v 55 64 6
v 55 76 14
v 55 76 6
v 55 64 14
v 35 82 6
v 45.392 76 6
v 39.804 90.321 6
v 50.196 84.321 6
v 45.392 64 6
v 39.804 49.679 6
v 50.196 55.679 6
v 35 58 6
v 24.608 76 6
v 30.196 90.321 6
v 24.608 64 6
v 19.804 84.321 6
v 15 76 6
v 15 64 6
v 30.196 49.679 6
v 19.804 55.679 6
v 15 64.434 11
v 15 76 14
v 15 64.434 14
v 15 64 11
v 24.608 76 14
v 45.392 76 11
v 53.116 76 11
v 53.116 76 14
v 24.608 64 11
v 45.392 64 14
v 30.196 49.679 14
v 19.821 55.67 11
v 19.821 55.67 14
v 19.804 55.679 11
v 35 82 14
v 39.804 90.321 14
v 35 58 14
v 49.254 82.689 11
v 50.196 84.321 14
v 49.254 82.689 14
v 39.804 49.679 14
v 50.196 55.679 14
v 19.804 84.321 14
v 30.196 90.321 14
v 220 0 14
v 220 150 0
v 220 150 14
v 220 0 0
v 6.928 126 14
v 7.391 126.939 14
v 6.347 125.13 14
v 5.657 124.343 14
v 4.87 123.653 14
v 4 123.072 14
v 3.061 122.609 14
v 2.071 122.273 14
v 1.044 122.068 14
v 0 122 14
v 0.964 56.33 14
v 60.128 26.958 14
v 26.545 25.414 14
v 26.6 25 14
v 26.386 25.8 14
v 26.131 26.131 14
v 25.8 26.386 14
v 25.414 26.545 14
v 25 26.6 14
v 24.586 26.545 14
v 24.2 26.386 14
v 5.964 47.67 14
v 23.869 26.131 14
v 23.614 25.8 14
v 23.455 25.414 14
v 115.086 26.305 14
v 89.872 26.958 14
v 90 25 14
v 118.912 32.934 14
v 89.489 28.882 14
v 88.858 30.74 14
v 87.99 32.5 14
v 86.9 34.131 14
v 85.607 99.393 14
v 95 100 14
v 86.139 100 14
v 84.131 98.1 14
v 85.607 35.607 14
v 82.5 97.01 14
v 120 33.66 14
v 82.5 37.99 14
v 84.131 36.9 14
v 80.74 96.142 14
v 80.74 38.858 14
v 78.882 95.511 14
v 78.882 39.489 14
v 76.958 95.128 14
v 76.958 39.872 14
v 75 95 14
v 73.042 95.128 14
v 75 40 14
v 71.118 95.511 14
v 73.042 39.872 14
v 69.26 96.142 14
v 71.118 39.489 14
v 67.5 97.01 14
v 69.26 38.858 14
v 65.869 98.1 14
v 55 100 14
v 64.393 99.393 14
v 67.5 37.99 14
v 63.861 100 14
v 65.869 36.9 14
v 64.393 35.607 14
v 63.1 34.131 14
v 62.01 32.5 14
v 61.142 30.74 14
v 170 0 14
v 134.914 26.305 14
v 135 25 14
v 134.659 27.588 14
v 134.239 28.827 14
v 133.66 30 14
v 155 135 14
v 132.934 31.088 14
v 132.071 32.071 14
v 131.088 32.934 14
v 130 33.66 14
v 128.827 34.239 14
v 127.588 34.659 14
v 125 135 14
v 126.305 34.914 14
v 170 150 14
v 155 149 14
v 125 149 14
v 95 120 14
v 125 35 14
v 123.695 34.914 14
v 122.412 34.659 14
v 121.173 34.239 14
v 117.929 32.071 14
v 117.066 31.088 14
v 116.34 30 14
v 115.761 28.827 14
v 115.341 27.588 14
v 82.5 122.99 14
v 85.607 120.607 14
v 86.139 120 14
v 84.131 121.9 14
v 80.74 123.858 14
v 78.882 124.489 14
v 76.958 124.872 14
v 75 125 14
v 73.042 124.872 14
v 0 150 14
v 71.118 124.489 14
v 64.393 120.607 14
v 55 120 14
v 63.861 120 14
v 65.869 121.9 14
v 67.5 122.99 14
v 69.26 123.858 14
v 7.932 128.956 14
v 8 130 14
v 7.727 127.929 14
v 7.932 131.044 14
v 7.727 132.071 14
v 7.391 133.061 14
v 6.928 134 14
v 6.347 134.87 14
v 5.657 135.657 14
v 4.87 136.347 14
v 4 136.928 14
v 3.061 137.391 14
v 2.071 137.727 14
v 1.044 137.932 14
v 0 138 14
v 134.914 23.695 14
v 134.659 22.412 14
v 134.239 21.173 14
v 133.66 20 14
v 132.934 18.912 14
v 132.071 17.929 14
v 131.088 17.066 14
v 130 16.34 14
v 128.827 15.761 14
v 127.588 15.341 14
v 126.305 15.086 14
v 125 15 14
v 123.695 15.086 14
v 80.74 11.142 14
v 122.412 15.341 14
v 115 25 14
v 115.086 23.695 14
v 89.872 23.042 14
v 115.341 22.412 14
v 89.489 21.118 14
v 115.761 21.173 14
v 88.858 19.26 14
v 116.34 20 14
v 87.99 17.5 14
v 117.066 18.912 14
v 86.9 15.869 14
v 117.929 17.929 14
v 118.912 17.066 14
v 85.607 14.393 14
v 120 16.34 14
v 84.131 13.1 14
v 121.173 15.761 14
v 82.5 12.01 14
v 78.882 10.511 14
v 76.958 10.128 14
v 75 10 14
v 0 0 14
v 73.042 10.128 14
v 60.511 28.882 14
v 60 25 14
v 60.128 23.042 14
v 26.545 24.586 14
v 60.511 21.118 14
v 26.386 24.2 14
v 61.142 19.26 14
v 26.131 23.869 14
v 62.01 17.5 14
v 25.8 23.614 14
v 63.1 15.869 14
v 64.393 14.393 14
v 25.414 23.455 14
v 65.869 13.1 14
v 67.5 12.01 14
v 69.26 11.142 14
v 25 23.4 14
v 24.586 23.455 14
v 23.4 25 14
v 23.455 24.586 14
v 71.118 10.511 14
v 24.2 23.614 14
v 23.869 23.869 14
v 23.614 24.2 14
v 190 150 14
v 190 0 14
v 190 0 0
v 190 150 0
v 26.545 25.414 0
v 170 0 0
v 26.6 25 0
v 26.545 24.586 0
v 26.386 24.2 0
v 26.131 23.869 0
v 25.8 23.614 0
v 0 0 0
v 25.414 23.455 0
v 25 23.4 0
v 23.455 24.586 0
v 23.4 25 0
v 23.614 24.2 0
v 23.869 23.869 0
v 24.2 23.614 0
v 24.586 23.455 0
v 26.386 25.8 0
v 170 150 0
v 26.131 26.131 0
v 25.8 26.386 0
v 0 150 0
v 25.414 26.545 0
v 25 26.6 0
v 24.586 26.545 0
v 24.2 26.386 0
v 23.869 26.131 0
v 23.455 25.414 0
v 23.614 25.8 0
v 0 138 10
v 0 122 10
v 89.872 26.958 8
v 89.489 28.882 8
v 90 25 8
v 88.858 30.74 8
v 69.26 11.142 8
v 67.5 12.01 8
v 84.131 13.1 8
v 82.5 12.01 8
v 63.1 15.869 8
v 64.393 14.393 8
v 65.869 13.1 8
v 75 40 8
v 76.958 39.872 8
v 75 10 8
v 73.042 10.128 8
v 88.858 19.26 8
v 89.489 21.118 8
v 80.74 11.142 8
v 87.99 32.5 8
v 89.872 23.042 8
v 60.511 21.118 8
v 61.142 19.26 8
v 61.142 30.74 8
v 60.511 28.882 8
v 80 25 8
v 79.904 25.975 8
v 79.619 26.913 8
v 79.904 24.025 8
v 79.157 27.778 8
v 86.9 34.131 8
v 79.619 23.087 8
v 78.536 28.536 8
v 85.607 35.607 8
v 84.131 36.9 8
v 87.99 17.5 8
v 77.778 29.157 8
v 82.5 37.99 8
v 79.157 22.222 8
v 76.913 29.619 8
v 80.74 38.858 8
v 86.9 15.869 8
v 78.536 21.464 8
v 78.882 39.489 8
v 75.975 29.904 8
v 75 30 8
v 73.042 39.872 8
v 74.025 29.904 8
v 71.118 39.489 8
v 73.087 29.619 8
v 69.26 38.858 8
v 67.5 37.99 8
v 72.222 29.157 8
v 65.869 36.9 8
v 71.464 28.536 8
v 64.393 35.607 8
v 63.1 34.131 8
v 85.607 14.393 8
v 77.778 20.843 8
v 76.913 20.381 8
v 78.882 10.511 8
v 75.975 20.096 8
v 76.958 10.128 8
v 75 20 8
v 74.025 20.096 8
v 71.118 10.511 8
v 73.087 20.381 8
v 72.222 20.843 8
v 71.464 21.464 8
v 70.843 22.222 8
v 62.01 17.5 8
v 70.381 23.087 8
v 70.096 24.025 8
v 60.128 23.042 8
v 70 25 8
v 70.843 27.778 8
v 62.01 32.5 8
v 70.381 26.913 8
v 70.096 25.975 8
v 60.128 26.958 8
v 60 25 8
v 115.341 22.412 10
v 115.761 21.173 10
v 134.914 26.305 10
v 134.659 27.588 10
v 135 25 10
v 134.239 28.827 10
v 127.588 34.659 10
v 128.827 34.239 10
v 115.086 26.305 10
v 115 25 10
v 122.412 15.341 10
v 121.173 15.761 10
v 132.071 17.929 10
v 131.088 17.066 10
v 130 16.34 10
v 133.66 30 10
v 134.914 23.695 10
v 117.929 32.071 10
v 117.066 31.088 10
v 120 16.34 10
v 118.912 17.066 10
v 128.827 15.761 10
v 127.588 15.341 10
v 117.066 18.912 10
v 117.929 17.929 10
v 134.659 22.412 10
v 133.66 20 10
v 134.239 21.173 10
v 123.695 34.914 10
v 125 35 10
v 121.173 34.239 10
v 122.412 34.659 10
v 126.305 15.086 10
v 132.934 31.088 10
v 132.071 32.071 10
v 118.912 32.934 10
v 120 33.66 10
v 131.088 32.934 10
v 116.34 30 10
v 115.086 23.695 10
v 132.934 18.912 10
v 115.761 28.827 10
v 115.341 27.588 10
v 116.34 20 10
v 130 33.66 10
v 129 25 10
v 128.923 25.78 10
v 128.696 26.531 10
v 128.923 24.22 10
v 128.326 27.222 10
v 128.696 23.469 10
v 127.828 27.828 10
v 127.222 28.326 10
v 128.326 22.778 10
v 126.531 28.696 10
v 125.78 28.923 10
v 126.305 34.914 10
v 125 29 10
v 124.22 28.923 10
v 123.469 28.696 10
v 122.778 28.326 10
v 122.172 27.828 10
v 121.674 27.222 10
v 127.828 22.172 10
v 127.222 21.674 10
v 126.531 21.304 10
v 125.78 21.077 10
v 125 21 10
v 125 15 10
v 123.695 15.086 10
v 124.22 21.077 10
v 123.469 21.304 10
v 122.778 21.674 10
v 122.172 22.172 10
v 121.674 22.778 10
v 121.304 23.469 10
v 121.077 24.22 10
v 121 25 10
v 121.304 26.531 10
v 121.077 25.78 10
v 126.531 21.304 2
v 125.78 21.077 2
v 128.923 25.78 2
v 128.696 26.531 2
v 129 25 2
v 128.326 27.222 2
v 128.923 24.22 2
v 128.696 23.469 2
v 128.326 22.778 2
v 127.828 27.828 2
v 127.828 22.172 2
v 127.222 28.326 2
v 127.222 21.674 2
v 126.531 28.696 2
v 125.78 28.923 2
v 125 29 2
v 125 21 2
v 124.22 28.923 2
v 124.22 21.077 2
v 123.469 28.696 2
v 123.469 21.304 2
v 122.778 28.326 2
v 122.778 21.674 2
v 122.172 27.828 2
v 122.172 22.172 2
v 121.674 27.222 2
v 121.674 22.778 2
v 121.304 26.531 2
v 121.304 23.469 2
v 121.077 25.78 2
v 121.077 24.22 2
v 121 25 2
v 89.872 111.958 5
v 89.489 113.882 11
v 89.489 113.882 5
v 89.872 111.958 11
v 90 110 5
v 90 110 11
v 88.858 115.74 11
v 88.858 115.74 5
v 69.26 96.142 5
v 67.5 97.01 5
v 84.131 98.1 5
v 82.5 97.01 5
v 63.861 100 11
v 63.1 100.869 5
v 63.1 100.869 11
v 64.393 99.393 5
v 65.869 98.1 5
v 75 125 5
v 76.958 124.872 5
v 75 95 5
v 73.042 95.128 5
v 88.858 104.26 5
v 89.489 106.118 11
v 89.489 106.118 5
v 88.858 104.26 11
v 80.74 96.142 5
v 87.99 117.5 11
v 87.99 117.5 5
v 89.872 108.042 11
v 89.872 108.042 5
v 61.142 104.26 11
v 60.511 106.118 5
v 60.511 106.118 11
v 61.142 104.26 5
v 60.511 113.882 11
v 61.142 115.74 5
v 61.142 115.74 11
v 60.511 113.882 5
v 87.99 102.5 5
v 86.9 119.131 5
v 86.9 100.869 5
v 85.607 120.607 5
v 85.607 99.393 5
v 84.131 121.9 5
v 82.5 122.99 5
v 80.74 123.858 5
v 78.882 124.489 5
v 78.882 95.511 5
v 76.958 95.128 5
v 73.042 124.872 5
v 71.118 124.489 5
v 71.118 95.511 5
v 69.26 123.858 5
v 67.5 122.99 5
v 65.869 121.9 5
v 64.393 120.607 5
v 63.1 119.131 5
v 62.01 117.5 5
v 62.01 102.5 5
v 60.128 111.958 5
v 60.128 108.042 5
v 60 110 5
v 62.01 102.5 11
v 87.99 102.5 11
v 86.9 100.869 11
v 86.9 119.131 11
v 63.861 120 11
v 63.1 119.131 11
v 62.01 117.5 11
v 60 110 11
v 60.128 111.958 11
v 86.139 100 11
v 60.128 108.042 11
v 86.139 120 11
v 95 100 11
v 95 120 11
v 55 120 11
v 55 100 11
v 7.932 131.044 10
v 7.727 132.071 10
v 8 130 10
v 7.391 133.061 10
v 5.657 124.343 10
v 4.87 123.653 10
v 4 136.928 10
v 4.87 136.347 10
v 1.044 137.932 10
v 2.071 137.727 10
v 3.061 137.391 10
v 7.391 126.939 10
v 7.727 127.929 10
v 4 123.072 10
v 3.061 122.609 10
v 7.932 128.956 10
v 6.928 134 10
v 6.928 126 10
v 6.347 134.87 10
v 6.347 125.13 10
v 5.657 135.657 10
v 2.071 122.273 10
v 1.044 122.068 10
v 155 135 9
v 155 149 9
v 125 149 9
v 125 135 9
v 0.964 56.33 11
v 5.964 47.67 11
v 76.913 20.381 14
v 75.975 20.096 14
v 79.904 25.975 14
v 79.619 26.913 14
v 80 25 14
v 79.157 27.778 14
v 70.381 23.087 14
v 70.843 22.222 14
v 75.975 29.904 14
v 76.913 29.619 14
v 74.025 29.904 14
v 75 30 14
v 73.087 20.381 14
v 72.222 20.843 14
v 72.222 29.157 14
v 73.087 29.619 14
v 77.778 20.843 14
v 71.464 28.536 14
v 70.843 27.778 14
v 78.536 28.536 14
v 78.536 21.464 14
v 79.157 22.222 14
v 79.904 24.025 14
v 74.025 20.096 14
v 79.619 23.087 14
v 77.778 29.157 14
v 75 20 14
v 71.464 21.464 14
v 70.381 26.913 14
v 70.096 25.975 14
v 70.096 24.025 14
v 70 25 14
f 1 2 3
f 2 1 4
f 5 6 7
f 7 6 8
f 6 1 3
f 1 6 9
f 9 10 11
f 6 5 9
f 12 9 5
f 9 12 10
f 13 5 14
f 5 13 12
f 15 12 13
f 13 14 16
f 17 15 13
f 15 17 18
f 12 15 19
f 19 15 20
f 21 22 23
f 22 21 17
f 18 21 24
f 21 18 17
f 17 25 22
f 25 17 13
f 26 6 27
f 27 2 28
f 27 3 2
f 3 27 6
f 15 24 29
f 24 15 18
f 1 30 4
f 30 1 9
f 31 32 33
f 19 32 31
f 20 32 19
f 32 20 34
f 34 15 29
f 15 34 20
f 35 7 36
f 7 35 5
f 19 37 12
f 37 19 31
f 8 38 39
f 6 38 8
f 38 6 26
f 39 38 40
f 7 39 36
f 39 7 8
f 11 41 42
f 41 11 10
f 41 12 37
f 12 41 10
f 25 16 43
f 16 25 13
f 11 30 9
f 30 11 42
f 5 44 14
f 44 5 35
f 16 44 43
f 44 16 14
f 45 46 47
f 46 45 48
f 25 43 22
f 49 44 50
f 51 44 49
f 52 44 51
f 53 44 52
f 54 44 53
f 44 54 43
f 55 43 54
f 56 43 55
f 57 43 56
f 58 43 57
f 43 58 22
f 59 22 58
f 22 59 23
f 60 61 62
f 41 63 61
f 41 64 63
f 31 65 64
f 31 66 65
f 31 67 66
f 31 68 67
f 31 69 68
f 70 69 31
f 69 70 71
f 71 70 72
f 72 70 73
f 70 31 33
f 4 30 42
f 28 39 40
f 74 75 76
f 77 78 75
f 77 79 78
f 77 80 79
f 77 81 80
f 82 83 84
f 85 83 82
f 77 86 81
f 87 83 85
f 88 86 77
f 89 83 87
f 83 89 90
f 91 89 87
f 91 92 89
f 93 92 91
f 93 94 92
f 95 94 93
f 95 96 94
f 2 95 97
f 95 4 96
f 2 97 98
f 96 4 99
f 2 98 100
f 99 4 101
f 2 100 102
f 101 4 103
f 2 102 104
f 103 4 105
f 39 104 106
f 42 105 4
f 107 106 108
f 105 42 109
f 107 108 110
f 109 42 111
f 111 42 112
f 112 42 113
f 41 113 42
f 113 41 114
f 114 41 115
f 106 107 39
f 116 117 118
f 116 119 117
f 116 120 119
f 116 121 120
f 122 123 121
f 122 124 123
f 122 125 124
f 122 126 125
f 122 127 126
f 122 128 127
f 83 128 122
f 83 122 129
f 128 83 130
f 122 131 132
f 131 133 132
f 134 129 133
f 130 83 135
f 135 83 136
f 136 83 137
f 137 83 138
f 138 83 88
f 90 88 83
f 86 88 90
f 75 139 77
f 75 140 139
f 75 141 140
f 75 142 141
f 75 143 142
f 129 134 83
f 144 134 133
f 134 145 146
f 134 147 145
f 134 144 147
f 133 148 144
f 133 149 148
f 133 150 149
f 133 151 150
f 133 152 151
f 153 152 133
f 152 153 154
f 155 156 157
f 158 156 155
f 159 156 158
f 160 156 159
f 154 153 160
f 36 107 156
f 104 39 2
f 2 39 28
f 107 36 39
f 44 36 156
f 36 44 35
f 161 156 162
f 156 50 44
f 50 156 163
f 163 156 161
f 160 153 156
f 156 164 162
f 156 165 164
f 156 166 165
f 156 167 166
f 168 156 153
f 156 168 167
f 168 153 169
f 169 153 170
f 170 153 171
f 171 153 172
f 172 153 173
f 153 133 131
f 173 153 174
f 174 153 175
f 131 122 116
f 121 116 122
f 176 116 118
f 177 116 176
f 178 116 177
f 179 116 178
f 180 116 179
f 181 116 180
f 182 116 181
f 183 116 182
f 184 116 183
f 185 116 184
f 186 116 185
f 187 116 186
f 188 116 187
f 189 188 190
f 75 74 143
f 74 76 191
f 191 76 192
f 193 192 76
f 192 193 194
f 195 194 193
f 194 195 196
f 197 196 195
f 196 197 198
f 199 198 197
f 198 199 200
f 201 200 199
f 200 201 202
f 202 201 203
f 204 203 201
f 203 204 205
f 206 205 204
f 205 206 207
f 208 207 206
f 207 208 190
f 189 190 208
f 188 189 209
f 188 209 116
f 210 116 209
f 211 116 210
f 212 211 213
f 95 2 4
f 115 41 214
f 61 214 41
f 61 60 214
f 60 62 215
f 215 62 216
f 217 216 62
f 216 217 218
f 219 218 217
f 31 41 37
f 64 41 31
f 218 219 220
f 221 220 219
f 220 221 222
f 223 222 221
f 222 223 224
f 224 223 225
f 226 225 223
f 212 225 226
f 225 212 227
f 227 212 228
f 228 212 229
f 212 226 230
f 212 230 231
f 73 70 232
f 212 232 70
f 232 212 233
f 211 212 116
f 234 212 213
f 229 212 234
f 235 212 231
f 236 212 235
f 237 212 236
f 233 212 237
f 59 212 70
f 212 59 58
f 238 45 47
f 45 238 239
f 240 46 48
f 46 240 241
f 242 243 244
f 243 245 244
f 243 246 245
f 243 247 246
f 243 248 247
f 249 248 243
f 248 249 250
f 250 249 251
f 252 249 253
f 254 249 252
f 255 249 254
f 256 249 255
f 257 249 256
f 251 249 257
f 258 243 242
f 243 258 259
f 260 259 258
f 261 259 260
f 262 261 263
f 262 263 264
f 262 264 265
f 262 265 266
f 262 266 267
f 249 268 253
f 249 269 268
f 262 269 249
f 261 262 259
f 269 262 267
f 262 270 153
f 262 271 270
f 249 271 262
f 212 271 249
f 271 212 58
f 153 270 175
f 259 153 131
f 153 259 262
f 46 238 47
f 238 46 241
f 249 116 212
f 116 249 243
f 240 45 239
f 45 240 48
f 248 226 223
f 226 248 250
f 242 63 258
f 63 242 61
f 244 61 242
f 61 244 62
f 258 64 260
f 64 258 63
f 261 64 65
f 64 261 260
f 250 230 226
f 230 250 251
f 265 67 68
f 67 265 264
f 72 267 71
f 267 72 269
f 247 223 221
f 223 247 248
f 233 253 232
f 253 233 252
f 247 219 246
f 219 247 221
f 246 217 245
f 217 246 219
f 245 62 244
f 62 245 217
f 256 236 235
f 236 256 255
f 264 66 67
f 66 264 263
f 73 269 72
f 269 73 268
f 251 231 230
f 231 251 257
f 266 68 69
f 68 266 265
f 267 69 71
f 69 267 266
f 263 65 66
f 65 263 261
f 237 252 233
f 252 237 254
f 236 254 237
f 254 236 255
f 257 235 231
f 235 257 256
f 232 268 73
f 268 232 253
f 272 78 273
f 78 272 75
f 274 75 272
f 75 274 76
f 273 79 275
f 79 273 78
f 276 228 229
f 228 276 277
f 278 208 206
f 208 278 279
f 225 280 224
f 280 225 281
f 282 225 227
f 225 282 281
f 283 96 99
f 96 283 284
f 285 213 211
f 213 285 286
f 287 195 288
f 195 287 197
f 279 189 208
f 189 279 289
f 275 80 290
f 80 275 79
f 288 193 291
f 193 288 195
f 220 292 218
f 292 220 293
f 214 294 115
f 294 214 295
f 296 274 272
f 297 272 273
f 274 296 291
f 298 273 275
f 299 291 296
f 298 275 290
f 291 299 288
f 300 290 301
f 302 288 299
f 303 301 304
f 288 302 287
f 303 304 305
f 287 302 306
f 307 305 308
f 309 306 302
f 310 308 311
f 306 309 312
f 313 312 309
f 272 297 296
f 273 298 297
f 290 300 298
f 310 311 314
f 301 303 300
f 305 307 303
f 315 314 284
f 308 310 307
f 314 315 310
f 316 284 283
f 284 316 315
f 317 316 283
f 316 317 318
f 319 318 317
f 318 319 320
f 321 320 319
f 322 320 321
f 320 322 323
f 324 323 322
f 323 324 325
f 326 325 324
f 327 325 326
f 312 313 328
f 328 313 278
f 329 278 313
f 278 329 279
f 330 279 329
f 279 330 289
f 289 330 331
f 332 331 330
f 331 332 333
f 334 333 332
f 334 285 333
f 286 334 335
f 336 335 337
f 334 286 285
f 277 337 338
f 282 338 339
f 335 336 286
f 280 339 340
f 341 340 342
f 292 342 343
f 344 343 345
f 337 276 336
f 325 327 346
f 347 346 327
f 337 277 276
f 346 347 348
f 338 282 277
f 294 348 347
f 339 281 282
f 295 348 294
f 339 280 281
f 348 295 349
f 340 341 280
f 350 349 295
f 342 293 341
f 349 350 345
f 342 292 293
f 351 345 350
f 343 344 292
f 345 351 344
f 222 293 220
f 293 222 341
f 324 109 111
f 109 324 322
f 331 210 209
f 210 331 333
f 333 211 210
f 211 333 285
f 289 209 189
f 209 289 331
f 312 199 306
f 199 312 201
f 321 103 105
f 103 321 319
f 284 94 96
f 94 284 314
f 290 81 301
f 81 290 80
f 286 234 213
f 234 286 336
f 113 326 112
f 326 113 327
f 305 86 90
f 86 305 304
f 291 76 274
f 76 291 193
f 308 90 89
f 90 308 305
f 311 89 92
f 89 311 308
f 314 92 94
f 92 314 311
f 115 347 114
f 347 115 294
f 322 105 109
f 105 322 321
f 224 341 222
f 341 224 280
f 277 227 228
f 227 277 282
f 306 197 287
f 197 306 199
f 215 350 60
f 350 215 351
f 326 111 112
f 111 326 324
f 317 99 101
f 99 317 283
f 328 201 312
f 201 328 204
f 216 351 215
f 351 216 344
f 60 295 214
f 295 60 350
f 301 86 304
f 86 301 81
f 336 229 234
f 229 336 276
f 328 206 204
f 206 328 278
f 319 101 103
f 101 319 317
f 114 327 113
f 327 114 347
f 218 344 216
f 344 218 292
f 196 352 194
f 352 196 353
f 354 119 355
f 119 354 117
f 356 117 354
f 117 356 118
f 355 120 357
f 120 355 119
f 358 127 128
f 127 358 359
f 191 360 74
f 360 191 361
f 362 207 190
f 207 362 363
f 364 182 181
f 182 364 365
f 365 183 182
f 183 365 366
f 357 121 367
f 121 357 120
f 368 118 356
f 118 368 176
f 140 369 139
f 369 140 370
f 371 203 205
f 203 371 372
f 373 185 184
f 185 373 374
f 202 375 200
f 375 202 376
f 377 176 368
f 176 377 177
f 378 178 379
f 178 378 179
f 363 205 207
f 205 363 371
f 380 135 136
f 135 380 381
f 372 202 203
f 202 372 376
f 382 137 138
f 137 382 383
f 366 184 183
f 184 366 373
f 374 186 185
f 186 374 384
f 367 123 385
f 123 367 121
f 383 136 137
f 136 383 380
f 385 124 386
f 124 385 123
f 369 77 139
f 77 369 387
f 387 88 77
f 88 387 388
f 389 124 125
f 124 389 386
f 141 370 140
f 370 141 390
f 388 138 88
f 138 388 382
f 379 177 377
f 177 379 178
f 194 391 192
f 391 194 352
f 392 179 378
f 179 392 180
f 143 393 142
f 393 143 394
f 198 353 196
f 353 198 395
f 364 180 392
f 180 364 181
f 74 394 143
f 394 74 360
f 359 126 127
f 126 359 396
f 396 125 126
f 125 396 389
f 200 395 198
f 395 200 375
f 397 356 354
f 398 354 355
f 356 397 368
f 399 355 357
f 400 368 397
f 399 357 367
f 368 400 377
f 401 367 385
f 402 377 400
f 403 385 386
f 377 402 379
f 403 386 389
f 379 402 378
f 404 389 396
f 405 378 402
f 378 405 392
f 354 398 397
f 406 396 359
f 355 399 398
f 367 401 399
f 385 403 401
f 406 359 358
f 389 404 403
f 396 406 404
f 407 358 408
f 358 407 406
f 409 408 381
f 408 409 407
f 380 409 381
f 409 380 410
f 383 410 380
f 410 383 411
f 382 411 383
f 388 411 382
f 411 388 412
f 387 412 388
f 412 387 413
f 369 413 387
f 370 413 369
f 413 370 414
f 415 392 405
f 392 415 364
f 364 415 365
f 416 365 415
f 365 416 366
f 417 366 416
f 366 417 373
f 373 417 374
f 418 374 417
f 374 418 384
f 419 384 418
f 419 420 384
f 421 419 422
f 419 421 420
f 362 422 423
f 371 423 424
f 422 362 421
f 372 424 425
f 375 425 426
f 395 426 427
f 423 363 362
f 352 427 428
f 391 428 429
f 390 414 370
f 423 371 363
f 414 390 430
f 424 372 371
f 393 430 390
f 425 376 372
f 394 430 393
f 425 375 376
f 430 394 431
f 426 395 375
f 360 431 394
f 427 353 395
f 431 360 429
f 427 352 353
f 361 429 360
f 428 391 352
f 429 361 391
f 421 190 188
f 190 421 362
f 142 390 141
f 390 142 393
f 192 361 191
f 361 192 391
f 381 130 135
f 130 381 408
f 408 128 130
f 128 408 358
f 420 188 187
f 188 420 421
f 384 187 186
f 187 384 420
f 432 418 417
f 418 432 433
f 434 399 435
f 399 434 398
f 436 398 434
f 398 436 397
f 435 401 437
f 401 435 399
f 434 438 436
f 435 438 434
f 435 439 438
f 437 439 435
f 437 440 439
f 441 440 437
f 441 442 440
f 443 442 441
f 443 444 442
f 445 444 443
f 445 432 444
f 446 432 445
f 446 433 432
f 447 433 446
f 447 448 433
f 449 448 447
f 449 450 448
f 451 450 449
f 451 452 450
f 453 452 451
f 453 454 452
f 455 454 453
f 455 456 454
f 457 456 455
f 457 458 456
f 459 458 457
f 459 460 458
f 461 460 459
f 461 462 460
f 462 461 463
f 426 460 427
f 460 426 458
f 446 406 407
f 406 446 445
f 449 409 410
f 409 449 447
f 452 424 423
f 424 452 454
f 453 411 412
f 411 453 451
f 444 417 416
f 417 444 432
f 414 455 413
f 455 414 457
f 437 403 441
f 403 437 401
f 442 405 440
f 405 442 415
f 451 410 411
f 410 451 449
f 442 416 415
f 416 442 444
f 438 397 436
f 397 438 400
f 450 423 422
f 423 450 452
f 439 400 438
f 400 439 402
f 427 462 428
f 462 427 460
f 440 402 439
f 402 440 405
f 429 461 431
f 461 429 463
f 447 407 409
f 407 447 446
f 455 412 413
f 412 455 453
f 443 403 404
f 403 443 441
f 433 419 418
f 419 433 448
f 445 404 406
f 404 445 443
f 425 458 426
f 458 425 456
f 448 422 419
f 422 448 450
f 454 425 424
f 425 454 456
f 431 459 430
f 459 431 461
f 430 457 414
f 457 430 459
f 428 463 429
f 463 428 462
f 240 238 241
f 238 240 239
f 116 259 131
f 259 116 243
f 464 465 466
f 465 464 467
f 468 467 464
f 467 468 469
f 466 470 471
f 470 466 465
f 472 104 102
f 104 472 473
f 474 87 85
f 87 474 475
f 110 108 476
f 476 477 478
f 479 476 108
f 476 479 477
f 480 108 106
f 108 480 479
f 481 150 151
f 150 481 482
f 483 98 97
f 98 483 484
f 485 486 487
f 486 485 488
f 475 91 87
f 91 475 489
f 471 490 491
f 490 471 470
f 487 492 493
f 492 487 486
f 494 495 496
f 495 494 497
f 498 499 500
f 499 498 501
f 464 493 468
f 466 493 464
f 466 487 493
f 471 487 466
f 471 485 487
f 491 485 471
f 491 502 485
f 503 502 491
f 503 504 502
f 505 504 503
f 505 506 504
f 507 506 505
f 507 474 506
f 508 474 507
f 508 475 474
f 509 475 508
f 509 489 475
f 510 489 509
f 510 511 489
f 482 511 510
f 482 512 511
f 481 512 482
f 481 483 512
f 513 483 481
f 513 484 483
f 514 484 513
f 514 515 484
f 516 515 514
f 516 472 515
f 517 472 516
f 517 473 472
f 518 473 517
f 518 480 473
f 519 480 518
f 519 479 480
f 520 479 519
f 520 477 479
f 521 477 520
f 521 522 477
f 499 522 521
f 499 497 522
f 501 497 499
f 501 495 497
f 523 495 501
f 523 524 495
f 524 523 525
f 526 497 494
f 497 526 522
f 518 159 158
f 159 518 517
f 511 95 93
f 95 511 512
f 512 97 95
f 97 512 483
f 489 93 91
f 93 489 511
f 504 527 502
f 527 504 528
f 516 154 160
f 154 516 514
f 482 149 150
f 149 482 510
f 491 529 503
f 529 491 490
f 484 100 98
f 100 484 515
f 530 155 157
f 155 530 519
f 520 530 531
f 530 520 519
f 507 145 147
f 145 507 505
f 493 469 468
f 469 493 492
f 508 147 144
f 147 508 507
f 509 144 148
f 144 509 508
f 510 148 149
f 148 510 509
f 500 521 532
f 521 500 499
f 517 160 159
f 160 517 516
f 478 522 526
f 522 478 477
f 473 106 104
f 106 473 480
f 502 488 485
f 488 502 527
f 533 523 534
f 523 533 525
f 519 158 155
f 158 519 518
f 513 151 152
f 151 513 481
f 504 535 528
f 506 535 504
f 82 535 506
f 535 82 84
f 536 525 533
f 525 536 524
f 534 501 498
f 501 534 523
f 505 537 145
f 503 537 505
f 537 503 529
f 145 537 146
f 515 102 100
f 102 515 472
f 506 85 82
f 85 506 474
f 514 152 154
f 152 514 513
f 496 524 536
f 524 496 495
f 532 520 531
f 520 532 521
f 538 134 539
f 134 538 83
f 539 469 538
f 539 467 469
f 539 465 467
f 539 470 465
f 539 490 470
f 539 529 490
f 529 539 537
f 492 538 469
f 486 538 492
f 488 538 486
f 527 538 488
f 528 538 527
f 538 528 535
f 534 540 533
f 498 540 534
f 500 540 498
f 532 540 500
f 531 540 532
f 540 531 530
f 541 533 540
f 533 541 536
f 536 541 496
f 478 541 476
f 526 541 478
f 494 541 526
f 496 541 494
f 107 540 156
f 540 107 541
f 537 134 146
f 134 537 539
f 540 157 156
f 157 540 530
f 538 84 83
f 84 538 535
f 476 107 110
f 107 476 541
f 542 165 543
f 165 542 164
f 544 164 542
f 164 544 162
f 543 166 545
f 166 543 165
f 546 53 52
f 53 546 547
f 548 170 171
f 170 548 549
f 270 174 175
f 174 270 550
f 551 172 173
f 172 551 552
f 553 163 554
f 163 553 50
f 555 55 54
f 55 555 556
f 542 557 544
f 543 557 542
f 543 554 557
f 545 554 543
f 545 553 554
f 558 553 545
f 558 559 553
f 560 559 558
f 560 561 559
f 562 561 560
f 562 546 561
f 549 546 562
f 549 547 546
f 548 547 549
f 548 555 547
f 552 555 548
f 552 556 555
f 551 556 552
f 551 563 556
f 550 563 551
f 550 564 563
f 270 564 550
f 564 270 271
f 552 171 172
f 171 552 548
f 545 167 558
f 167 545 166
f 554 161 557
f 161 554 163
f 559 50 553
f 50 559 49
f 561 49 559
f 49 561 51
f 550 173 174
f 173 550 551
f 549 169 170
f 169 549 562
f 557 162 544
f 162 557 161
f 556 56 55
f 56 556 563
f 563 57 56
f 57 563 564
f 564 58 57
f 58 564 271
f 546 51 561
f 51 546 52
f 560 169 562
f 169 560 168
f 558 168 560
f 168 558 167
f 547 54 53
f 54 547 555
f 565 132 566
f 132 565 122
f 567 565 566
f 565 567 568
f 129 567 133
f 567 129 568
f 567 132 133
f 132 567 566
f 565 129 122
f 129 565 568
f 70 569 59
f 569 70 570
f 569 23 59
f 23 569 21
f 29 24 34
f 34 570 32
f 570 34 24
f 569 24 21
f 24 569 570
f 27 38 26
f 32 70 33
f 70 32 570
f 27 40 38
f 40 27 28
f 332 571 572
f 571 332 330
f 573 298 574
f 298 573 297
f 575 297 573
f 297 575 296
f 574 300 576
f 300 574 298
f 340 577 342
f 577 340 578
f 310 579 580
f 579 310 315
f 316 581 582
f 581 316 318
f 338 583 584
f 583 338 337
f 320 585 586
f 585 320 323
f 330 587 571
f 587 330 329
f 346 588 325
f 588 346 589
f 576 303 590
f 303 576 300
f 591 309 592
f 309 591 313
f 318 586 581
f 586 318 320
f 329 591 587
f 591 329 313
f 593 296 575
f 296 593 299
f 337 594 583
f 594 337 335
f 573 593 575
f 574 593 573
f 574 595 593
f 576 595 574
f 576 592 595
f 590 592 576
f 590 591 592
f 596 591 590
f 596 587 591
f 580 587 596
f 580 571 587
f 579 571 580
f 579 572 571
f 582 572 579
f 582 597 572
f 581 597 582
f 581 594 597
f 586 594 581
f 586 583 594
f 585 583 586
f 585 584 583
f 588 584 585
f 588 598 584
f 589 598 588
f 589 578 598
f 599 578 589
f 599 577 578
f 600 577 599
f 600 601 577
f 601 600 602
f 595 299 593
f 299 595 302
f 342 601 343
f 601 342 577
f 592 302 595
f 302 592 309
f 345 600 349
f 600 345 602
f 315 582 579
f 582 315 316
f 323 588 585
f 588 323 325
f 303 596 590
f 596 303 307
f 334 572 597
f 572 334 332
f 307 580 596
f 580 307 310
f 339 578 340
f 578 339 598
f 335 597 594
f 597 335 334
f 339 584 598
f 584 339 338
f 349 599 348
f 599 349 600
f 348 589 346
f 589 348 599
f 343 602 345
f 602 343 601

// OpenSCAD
// Test model exercising every auto-detected operation type:
//   profile, drill, pocket, pocket+island, stepped pocket (tier-split),
//   through slot, slot-crossing-pocket (merge/demerge), edge-pocket, open-contour,
//   and a rotated single-exit slot crossing a complex (non-round, non-rectangular)
//   shape at a different depth (rotation + boundary-touch + tier-split combined)

blockX = 220;
blockY = 150;
blockZ = 14;

// 1. Drill — small through hole (<= tool diameter)
drillPos   = [25, 25];
drillDia   = 3.2;

// 2. Pocket with island — blind round pocket, boss standing in the middle
pocketIslandPos    = [75, 25];
pocketIslandDia    = 30;
pocketIslandFloorZ = 8;   // depth 6mm
islandDia          = 10;

// 3. Stepped pocket — wide shallow counterbore over a narrower deeper bore
stepPos       = [125, 25];
stepADia      = 20;
stepAFloorZ   = 10;  // counterbore depth 4mm
stepBDia      = 8;
stepBFloorZ   = 2;   // total depth 12mm, blind (2mm left on floor)

// 4. Through slot — open on both Y ends, splits the top outline in two
slotX      = 170;
slotWidth  = 20;

// 5. Slot crossing a pocket — merge/demerge test
crossPocketPos    = [75, 110];
crossPocketDia    = 30;
crossPocketFloorZ = 5;   // pocket depth 9mm, blind
crossSlotFloorZ   = 11;  // crossing channel depth 3mm — overlaps pocket near the top only

// 6. Edge pocket — concave notch cut into the X=0 edge
edgePocketPos    = [0, 130];
edgePocketRadius = 8;
edgePocketFloorZ = 10;   // depth 4mm

// 7. Open-contour — a bite taken out of the Y=150 edge, too big/shaped to be a plain slot
openContourPos    = [125, 135];
openContourWidth  = 30;
openContourDepth  = 14;  // stops 1mm short of the Y=150 edge — stays a closed void
                          // contour (within the boundary-proximity threshold) instead
                          // of literally puncturing the perimeter, which would just
                          // reshape the outer contour instead of creating a trackable void
openContourFloorZ = 9;   // depth 5mm, blind

// 8. Complex (3-arm asterisk) shape crossed by a rotated, single-exit slot — the two
// pieces sit at DIFFERENT depths, so they read as one merged open-contour void near the
// top (where the slot overlaps the shape and reaches the X=0 edge) and demerge into a
// plain enclosed complex pocket for the remainder of the shape's depth, once the shallow
// slot has bottomed out. Exercises rotation, single-sided boundary exit, and a
// classification change (open-contour -> pocket) across the tier split all at once.
blobPos        = [35, 70];
blobArmLength  = 40;
blobArmWidth   = 12;
blobFloorZ     = 6;   // total depth 8mm
slotPivot      = [0, 50];  // sits on the X=0 edge
slotAngle      = 30;       // degrees off the X axis
slotNearOffset = 4;   // local x start — leaves a ~1mm wall at the tightest rotated
                       // corner so this stays a closed void (within the boundary-
                       // proximity threshold) instead of literally breaching the X=0
                       // face, which would merge it into the outer contour and make it
                       // undetectable (same failure mode fixed for feature 7 above)
slotLength     = 55;
slotCutWidth   = 10;
slotFloorZ     = 11;  // crossing portion depth 3mm — shallower than the blob

module base() {
  difference() {
    cube([blockX, blockY, blockZ]);

    // 1. Drill
    translate([drillPos[0], drillPos[1], -1])
      cylinder(d = drillDia, h = blockZ + 2, $fn = 24);

    // 2. Pocket (island re-added via union below)
    translate([pocketIslandPos[0], pocketIslandPos[1], pocketIslandFloorZ])
      cylinder(d = pocketIslandDia, h = blockZ - pocketIslandFloorZ + 1, $fn = 48);

    // 3. Stepped pocket — counterbore tier
    translate([stepPos[0], stepPos[1], stepAFloorZ])
      cylinder(d = stepADia, h = blockZ - stepAFloorZ + 1, $fn = 48);
    // Stepped pocket — narrower deeper tier
    translate([stepPos[0], stepPos[1], stepBFloorZ])
      cylinder(d = stepBDia, h = blockZ - stepBFloorZ + 1, $fn = 32);

    // 4. Through slot (open both Y ends)
    translate([slotX, -1, -1])
      cube([slotWidth, blockY + 2, blockZ + 2]);

    // 5. Slot-crossing-pocket — the round pocket
    translate([crossPocketPos[0], crossPocketPos[1], crossPocketFloorZ])
      cylinder(d = crossPocketDia, h = blockZ - crossPocketFloorZ + 1, $fn = 48);
    // Slot-crossing-pocket — the shallow crossing channel
    translate([crossPocketPos[0] - 20, crossPocketPos[1] - 10, crossSlotFloorZ])
      cube([40, 20, blockZ - crossSlotFloorZ + 1]);

    // 6. Edge pocket — half-cylinder notch on the X=0 edge
    translate([edgePocketPos[0], edgePocketPos[1], edgePocketFloorZ])
      cylinder(r = edgePocketRadius, h = blockZ - edgePocketFloorZ + 1, $fn = 48);

    // 7. Open-contour — rectangular bite out of the Y=150 edge
    translate([openContourPos[0], openContourPos[1], openContourFloorZ])
      cube([openContourWidth, openContourDepth, blockZ - openContourFloorZ + 1]);

    // 8. Complex asterisk pocket (deeper tier)
    translate([blobPos[0], blobPos[1], 0])
      for (a = [0, 60, 120])
        rotate([0, 0, a])
          translate([-blobArmLength / 2, -blobArmWidth / 2, blobFloorZ])
            cube([blobArmLength, blobArmWidth, blockZ - blobFloorZ + 1]);

    // 8. Rotated single-exit slot crossing the asterisk (shallow tier, exits only at X=0)
    translate([slotPivot[0], slotPivot[1], 0])
      rotate([0, 0, slotAngle])
        translate([slotNearOffset, -slotCutWidth / 2, slotFloorZ])
          cube([slotLength, slotCutWidth, blockZ - slotFloorZ + 1]);
  }
}

union() {
  base();
  // Island boss standing inside the pocket from feature 2
  translate([pocketIslandPos[0], pocketIslandPos[1], pocketIslandFloorZ])
    cylinder(d = islandDia, h = blockZ - pocketIslandFloorZ, $fn = 32);
}
